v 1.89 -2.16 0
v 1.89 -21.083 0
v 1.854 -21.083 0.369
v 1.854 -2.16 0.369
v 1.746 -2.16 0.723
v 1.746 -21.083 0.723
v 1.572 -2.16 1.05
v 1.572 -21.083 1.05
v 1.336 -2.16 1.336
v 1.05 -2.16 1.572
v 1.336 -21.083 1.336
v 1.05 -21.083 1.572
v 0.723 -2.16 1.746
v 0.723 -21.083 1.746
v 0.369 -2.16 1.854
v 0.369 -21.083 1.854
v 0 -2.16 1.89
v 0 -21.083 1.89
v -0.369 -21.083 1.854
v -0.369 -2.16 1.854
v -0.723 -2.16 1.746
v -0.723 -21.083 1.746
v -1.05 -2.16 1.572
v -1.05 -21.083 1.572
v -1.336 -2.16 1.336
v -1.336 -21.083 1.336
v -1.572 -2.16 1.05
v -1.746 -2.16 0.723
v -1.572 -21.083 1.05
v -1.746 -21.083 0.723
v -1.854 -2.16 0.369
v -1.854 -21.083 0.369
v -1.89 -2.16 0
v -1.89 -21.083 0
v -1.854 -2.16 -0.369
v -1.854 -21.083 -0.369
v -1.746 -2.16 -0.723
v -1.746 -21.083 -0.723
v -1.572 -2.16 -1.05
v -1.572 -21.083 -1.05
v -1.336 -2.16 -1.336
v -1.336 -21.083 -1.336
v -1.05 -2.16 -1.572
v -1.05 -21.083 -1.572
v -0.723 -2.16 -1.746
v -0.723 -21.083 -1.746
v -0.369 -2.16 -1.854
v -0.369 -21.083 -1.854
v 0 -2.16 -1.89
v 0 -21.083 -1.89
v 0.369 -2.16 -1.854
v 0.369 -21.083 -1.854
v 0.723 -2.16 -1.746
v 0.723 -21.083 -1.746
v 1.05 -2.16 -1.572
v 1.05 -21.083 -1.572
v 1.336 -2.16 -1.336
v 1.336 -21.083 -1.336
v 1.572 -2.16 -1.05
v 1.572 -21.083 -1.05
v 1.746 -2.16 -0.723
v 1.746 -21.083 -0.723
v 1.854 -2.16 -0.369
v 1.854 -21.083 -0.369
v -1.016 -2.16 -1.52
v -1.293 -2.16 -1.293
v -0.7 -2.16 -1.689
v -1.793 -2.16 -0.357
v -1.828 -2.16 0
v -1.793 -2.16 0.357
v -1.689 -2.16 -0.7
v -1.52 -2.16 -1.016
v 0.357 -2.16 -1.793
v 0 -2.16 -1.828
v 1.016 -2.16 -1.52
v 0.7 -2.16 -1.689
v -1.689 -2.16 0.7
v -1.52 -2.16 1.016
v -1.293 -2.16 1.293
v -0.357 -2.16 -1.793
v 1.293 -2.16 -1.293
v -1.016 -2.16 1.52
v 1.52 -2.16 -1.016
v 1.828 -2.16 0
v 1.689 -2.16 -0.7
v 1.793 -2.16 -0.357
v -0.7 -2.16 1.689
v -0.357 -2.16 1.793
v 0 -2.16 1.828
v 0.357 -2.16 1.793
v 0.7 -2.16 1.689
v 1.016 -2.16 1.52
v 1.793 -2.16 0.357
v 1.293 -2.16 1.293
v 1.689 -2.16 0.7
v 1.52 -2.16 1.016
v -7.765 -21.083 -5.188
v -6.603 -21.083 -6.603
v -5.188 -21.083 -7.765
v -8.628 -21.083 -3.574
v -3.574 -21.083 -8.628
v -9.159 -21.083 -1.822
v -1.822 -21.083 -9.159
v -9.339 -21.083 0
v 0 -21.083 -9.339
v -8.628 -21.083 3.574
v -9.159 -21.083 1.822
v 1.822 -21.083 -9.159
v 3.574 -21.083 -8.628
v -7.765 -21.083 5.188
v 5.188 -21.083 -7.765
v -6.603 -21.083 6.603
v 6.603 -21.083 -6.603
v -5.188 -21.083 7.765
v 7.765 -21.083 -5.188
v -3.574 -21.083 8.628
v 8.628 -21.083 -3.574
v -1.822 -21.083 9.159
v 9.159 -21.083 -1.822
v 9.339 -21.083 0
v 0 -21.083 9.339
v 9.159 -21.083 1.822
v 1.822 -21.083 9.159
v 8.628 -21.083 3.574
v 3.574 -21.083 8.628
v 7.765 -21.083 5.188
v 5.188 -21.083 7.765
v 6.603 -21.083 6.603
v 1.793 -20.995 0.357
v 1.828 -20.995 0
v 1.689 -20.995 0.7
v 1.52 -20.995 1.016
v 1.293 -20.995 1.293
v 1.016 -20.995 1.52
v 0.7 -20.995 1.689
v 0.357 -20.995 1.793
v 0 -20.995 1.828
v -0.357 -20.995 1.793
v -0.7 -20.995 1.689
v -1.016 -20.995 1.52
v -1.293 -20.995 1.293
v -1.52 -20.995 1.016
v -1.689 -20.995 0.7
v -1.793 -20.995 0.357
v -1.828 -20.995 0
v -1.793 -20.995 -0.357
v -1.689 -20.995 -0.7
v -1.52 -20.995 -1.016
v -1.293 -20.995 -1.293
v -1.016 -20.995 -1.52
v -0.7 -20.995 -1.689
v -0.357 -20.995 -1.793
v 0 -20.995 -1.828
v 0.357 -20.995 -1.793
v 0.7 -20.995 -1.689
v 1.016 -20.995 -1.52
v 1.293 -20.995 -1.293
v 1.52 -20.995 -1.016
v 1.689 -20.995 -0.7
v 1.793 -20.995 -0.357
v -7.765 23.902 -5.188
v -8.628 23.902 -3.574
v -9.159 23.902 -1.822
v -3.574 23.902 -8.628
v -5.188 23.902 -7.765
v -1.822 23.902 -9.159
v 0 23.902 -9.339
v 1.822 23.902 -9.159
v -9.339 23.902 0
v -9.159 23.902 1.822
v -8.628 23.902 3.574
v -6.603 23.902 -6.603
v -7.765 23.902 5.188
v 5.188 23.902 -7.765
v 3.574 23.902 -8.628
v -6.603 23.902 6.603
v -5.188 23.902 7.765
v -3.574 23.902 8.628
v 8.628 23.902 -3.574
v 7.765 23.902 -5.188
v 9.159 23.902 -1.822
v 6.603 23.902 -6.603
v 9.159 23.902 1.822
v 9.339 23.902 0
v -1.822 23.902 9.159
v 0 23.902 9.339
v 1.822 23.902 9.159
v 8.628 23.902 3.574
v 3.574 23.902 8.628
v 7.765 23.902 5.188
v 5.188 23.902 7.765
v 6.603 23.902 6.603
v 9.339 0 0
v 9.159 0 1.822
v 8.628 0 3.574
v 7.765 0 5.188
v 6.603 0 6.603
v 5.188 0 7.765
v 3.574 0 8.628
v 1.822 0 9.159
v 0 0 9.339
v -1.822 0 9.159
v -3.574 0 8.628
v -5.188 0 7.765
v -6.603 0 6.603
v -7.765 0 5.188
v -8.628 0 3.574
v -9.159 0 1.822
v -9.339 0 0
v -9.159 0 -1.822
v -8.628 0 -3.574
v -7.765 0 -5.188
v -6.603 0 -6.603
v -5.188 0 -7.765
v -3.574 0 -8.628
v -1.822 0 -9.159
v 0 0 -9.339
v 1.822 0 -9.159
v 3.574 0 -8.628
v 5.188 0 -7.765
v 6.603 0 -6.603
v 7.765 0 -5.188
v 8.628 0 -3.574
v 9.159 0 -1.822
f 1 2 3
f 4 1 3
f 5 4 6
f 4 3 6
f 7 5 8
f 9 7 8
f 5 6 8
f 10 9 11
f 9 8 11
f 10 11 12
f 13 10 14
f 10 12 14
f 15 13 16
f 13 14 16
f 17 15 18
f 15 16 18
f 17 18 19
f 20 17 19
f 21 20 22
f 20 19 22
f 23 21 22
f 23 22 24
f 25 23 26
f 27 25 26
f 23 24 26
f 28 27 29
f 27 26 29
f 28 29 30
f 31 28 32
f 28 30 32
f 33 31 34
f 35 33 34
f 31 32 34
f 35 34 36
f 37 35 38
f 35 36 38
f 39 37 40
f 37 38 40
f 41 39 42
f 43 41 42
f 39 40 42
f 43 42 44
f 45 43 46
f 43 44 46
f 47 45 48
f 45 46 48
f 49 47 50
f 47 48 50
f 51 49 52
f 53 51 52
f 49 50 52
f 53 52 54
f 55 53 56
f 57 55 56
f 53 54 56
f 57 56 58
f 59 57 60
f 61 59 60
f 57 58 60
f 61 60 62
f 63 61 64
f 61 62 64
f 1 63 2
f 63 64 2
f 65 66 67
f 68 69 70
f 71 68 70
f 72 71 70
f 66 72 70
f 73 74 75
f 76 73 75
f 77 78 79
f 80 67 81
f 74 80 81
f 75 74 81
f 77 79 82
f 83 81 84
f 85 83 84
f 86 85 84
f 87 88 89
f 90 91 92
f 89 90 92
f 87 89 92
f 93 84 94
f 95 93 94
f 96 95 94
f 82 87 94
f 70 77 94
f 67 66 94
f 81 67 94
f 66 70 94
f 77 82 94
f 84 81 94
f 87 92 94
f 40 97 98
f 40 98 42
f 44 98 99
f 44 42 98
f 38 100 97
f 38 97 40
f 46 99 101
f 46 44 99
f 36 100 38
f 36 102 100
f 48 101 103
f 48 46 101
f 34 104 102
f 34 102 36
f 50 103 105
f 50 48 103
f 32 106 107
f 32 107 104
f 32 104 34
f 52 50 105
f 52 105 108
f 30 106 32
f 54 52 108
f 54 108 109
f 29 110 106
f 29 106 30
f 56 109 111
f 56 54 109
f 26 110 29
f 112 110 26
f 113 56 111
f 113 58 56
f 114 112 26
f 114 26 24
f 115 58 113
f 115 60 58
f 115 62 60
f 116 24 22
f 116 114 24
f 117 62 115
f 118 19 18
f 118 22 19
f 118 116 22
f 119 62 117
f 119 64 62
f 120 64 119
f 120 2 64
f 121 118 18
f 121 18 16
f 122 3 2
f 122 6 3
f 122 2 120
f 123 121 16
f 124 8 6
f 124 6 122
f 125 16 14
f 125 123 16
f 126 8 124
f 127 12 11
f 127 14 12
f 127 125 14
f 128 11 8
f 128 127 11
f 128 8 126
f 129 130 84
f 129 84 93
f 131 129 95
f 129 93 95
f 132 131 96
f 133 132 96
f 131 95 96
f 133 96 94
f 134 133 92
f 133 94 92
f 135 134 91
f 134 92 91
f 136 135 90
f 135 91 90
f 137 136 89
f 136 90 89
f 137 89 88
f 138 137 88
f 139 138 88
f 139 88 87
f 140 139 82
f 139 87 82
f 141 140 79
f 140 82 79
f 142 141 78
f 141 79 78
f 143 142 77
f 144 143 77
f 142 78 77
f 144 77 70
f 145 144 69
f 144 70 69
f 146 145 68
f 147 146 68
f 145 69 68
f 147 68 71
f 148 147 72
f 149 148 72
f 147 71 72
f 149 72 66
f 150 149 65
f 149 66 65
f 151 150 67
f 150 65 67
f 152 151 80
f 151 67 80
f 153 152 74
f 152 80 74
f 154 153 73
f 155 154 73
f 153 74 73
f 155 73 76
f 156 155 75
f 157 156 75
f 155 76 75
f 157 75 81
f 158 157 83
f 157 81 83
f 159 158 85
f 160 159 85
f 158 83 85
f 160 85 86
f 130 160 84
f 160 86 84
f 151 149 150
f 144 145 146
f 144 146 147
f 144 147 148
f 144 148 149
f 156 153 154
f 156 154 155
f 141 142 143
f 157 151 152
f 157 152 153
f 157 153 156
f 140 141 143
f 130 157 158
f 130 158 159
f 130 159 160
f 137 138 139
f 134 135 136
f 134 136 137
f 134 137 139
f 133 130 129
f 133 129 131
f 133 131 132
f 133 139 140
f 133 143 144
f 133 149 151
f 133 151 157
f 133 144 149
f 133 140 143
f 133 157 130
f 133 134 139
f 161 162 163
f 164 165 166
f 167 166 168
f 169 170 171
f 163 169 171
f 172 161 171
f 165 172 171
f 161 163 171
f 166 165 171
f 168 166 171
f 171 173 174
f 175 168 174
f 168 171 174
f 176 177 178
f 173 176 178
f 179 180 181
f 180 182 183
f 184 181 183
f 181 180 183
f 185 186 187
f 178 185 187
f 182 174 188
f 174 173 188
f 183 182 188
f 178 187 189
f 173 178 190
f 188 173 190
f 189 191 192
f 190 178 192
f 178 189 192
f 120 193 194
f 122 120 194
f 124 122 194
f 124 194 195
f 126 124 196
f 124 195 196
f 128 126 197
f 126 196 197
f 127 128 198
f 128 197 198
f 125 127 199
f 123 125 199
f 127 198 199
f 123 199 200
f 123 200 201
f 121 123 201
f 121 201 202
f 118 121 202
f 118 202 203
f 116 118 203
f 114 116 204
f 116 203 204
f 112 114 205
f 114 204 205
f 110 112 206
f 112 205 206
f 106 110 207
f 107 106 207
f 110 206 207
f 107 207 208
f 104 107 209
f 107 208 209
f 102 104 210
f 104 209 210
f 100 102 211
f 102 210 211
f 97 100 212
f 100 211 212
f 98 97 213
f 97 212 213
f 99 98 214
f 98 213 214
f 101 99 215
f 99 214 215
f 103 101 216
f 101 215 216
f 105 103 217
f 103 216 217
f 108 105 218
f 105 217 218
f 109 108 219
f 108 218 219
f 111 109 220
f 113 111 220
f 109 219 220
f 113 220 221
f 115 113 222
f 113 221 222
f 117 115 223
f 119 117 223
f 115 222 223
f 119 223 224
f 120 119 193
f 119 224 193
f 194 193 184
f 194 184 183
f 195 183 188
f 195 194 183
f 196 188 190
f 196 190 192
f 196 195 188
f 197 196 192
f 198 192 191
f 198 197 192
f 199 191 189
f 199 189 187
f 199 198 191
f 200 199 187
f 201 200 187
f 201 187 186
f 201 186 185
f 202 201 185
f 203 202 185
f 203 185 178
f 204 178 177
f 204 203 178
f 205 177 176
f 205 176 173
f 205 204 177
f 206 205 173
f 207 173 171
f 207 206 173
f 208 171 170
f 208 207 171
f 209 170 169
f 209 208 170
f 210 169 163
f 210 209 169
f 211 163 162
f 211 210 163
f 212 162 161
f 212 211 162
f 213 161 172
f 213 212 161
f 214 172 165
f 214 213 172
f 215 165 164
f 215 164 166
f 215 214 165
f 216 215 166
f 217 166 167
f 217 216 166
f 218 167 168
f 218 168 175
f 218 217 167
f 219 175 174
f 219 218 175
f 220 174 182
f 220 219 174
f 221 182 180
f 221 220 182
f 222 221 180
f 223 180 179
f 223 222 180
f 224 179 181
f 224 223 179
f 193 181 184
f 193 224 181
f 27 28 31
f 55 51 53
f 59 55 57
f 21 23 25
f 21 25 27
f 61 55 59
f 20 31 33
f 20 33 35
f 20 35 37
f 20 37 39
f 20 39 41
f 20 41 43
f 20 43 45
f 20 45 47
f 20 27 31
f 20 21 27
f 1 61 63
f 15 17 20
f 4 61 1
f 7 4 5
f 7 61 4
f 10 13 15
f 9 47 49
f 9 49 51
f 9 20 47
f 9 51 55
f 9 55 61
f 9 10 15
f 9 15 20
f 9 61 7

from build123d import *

# Parameters (mm, degrees)
F0_R          = 9.3386077144
F1_DEPTH      = 23.9015780389
F1_DEPTH_BACK = 21.0829656571
F2_R          = 1.8900761145
F3_DEPTH      = 18.9224872738
F4_R          = 1.8282157513
F5_DEPTH      = 18.8347734511


with BuildPart() as f1:
    # F0 (on Front) → F1 (new body, two sides)
    with BuildSketch(Plane.XZ) as f1_sk:
        Circle(F0_R)
    extrude(amount=-F1_DEPTH)
    extrude(f1_sk.sketch, amount=F1_DEPTH_BACK)

    # F2 (on face) → F3 (cut)
    with BuildSketch(Plane.XZ.offset(21.0829656571)):
        Circle(F2_R)
    extrude(amount=-F3_DEPTH, mode=Mode.SUBTRACT)


with BuildPart() as f5:
    # F4 (on face) → F5 (new body)
    with BuildSketch(Plane.XZ.offset(2.1604783833)):
        Circle(F4_R)
    extrude(amount=F5_DEPTH)


solid = Compound([f1.part, f5.part])
